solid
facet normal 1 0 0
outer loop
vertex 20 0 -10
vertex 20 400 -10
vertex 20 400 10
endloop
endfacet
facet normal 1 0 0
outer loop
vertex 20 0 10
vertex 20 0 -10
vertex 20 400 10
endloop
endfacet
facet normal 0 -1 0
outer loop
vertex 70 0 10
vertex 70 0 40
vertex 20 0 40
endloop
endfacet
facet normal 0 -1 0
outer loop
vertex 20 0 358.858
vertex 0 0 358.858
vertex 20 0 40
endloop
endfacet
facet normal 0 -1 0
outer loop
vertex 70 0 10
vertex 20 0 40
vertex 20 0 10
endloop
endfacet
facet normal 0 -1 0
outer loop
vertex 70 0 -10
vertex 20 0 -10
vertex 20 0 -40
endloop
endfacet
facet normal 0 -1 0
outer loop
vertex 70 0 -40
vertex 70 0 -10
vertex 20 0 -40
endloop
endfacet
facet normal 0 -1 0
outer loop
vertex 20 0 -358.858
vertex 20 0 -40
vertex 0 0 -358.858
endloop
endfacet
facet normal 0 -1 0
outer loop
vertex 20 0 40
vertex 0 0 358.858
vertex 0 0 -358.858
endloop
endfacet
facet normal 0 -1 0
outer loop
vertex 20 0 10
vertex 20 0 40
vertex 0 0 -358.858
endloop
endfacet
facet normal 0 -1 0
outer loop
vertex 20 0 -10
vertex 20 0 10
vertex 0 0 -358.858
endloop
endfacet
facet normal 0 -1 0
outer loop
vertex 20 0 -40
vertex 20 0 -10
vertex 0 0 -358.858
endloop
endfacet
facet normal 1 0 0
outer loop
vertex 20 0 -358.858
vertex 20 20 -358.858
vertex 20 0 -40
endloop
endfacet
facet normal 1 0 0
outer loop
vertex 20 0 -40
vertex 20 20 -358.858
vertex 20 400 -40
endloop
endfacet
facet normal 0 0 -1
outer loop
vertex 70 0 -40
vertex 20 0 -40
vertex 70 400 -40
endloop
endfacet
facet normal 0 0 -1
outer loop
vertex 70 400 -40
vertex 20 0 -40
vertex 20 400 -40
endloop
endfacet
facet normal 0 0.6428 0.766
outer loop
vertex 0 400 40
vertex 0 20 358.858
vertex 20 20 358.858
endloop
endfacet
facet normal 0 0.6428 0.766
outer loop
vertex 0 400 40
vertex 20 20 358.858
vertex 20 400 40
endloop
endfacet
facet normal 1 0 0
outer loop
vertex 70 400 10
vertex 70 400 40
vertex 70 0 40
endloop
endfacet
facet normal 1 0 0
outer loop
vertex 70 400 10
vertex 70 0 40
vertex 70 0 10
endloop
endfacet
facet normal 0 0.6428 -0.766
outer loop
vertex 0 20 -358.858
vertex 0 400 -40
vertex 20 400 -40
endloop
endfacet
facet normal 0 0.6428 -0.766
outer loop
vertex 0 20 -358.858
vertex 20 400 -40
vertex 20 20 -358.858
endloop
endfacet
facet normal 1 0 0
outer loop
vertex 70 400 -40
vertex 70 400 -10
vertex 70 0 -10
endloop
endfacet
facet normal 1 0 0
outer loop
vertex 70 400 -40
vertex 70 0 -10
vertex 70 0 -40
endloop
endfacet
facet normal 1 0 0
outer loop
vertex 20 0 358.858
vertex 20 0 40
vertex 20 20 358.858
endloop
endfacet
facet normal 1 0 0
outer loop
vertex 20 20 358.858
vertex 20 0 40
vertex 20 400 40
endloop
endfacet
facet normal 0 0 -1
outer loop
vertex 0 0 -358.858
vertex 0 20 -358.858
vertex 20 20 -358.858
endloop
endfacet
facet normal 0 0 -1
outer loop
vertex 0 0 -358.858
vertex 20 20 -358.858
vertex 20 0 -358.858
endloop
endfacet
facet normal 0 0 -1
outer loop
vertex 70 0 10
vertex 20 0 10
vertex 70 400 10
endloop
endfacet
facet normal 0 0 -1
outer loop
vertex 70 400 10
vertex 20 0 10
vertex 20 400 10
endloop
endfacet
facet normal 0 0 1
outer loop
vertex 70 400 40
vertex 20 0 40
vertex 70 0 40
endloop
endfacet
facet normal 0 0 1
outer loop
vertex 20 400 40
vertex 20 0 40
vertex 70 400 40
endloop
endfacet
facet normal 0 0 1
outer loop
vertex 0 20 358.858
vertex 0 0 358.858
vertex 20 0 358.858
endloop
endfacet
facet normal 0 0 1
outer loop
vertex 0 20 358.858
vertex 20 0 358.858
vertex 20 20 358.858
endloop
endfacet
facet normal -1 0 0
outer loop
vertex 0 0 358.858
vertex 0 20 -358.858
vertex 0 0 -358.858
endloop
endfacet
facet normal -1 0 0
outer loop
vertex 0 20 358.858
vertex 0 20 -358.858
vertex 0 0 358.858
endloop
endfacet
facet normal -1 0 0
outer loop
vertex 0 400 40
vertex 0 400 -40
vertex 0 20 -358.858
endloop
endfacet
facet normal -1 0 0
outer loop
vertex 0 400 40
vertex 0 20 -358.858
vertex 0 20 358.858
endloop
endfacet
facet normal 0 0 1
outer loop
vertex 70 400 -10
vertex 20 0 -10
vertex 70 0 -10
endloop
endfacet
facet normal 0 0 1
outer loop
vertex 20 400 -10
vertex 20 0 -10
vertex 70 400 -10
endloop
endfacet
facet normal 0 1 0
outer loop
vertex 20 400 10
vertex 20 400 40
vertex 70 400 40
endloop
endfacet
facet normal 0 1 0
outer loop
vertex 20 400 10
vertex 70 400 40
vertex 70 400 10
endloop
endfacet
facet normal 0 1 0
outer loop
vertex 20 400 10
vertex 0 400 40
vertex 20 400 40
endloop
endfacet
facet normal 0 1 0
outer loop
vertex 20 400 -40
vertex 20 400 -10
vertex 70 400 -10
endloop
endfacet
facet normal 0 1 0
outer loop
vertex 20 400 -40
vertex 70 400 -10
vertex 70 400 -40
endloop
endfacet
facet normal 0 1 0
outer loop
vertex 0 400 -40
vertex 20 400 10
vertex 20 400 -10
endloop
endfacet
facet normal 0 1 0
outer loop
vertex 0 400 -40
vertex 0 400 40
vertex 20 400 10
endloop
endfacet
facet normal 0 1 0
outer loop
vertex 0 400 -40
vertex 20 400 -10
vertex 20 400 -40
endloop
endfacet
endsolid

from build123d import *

# Parameters (mm, degrees)
BOSS_EXTRUDE1_DEPTH = 20
SKETCH3_W           = 30
SKETCH3_H           = 400
BOSS_EXTRUDE2_DEPTH = 50


with BuildPart() as part:
    # Sketch2 → Boss-Extrude1 (new body)
    with BuildSketch(Plane(origin=(0, 0, 0), x_dir=(0, 0, -1), z_dir=(1, 0, 0))):
        Polygon((-40, 400), (40, 400), (358.857859847, 20), (358.857859847, 0), (-358.857859847, 0), (-358.857859847, 20), align=None)
    extrude(amount=BOSS_EXTRUDE1_DEPTH)

    # Sketch3 → Boss-Extrude2 (add)
    with BuildSketch(Plane(origin=(20, 0, 0), x_dir=(0, 0, -1), z_dir=(1, 0, 0))):
        with Locations((-25, 200)):
            Rectangle(SKETCH3_W, SKETCH3_H)
        with Locations((25, 200)):
            Rectangle(SKETCH3_W, SKETCH3_H)
    extrude(amount=BOSS_EXTRUDE2_DEPTH)


solid = part.part
